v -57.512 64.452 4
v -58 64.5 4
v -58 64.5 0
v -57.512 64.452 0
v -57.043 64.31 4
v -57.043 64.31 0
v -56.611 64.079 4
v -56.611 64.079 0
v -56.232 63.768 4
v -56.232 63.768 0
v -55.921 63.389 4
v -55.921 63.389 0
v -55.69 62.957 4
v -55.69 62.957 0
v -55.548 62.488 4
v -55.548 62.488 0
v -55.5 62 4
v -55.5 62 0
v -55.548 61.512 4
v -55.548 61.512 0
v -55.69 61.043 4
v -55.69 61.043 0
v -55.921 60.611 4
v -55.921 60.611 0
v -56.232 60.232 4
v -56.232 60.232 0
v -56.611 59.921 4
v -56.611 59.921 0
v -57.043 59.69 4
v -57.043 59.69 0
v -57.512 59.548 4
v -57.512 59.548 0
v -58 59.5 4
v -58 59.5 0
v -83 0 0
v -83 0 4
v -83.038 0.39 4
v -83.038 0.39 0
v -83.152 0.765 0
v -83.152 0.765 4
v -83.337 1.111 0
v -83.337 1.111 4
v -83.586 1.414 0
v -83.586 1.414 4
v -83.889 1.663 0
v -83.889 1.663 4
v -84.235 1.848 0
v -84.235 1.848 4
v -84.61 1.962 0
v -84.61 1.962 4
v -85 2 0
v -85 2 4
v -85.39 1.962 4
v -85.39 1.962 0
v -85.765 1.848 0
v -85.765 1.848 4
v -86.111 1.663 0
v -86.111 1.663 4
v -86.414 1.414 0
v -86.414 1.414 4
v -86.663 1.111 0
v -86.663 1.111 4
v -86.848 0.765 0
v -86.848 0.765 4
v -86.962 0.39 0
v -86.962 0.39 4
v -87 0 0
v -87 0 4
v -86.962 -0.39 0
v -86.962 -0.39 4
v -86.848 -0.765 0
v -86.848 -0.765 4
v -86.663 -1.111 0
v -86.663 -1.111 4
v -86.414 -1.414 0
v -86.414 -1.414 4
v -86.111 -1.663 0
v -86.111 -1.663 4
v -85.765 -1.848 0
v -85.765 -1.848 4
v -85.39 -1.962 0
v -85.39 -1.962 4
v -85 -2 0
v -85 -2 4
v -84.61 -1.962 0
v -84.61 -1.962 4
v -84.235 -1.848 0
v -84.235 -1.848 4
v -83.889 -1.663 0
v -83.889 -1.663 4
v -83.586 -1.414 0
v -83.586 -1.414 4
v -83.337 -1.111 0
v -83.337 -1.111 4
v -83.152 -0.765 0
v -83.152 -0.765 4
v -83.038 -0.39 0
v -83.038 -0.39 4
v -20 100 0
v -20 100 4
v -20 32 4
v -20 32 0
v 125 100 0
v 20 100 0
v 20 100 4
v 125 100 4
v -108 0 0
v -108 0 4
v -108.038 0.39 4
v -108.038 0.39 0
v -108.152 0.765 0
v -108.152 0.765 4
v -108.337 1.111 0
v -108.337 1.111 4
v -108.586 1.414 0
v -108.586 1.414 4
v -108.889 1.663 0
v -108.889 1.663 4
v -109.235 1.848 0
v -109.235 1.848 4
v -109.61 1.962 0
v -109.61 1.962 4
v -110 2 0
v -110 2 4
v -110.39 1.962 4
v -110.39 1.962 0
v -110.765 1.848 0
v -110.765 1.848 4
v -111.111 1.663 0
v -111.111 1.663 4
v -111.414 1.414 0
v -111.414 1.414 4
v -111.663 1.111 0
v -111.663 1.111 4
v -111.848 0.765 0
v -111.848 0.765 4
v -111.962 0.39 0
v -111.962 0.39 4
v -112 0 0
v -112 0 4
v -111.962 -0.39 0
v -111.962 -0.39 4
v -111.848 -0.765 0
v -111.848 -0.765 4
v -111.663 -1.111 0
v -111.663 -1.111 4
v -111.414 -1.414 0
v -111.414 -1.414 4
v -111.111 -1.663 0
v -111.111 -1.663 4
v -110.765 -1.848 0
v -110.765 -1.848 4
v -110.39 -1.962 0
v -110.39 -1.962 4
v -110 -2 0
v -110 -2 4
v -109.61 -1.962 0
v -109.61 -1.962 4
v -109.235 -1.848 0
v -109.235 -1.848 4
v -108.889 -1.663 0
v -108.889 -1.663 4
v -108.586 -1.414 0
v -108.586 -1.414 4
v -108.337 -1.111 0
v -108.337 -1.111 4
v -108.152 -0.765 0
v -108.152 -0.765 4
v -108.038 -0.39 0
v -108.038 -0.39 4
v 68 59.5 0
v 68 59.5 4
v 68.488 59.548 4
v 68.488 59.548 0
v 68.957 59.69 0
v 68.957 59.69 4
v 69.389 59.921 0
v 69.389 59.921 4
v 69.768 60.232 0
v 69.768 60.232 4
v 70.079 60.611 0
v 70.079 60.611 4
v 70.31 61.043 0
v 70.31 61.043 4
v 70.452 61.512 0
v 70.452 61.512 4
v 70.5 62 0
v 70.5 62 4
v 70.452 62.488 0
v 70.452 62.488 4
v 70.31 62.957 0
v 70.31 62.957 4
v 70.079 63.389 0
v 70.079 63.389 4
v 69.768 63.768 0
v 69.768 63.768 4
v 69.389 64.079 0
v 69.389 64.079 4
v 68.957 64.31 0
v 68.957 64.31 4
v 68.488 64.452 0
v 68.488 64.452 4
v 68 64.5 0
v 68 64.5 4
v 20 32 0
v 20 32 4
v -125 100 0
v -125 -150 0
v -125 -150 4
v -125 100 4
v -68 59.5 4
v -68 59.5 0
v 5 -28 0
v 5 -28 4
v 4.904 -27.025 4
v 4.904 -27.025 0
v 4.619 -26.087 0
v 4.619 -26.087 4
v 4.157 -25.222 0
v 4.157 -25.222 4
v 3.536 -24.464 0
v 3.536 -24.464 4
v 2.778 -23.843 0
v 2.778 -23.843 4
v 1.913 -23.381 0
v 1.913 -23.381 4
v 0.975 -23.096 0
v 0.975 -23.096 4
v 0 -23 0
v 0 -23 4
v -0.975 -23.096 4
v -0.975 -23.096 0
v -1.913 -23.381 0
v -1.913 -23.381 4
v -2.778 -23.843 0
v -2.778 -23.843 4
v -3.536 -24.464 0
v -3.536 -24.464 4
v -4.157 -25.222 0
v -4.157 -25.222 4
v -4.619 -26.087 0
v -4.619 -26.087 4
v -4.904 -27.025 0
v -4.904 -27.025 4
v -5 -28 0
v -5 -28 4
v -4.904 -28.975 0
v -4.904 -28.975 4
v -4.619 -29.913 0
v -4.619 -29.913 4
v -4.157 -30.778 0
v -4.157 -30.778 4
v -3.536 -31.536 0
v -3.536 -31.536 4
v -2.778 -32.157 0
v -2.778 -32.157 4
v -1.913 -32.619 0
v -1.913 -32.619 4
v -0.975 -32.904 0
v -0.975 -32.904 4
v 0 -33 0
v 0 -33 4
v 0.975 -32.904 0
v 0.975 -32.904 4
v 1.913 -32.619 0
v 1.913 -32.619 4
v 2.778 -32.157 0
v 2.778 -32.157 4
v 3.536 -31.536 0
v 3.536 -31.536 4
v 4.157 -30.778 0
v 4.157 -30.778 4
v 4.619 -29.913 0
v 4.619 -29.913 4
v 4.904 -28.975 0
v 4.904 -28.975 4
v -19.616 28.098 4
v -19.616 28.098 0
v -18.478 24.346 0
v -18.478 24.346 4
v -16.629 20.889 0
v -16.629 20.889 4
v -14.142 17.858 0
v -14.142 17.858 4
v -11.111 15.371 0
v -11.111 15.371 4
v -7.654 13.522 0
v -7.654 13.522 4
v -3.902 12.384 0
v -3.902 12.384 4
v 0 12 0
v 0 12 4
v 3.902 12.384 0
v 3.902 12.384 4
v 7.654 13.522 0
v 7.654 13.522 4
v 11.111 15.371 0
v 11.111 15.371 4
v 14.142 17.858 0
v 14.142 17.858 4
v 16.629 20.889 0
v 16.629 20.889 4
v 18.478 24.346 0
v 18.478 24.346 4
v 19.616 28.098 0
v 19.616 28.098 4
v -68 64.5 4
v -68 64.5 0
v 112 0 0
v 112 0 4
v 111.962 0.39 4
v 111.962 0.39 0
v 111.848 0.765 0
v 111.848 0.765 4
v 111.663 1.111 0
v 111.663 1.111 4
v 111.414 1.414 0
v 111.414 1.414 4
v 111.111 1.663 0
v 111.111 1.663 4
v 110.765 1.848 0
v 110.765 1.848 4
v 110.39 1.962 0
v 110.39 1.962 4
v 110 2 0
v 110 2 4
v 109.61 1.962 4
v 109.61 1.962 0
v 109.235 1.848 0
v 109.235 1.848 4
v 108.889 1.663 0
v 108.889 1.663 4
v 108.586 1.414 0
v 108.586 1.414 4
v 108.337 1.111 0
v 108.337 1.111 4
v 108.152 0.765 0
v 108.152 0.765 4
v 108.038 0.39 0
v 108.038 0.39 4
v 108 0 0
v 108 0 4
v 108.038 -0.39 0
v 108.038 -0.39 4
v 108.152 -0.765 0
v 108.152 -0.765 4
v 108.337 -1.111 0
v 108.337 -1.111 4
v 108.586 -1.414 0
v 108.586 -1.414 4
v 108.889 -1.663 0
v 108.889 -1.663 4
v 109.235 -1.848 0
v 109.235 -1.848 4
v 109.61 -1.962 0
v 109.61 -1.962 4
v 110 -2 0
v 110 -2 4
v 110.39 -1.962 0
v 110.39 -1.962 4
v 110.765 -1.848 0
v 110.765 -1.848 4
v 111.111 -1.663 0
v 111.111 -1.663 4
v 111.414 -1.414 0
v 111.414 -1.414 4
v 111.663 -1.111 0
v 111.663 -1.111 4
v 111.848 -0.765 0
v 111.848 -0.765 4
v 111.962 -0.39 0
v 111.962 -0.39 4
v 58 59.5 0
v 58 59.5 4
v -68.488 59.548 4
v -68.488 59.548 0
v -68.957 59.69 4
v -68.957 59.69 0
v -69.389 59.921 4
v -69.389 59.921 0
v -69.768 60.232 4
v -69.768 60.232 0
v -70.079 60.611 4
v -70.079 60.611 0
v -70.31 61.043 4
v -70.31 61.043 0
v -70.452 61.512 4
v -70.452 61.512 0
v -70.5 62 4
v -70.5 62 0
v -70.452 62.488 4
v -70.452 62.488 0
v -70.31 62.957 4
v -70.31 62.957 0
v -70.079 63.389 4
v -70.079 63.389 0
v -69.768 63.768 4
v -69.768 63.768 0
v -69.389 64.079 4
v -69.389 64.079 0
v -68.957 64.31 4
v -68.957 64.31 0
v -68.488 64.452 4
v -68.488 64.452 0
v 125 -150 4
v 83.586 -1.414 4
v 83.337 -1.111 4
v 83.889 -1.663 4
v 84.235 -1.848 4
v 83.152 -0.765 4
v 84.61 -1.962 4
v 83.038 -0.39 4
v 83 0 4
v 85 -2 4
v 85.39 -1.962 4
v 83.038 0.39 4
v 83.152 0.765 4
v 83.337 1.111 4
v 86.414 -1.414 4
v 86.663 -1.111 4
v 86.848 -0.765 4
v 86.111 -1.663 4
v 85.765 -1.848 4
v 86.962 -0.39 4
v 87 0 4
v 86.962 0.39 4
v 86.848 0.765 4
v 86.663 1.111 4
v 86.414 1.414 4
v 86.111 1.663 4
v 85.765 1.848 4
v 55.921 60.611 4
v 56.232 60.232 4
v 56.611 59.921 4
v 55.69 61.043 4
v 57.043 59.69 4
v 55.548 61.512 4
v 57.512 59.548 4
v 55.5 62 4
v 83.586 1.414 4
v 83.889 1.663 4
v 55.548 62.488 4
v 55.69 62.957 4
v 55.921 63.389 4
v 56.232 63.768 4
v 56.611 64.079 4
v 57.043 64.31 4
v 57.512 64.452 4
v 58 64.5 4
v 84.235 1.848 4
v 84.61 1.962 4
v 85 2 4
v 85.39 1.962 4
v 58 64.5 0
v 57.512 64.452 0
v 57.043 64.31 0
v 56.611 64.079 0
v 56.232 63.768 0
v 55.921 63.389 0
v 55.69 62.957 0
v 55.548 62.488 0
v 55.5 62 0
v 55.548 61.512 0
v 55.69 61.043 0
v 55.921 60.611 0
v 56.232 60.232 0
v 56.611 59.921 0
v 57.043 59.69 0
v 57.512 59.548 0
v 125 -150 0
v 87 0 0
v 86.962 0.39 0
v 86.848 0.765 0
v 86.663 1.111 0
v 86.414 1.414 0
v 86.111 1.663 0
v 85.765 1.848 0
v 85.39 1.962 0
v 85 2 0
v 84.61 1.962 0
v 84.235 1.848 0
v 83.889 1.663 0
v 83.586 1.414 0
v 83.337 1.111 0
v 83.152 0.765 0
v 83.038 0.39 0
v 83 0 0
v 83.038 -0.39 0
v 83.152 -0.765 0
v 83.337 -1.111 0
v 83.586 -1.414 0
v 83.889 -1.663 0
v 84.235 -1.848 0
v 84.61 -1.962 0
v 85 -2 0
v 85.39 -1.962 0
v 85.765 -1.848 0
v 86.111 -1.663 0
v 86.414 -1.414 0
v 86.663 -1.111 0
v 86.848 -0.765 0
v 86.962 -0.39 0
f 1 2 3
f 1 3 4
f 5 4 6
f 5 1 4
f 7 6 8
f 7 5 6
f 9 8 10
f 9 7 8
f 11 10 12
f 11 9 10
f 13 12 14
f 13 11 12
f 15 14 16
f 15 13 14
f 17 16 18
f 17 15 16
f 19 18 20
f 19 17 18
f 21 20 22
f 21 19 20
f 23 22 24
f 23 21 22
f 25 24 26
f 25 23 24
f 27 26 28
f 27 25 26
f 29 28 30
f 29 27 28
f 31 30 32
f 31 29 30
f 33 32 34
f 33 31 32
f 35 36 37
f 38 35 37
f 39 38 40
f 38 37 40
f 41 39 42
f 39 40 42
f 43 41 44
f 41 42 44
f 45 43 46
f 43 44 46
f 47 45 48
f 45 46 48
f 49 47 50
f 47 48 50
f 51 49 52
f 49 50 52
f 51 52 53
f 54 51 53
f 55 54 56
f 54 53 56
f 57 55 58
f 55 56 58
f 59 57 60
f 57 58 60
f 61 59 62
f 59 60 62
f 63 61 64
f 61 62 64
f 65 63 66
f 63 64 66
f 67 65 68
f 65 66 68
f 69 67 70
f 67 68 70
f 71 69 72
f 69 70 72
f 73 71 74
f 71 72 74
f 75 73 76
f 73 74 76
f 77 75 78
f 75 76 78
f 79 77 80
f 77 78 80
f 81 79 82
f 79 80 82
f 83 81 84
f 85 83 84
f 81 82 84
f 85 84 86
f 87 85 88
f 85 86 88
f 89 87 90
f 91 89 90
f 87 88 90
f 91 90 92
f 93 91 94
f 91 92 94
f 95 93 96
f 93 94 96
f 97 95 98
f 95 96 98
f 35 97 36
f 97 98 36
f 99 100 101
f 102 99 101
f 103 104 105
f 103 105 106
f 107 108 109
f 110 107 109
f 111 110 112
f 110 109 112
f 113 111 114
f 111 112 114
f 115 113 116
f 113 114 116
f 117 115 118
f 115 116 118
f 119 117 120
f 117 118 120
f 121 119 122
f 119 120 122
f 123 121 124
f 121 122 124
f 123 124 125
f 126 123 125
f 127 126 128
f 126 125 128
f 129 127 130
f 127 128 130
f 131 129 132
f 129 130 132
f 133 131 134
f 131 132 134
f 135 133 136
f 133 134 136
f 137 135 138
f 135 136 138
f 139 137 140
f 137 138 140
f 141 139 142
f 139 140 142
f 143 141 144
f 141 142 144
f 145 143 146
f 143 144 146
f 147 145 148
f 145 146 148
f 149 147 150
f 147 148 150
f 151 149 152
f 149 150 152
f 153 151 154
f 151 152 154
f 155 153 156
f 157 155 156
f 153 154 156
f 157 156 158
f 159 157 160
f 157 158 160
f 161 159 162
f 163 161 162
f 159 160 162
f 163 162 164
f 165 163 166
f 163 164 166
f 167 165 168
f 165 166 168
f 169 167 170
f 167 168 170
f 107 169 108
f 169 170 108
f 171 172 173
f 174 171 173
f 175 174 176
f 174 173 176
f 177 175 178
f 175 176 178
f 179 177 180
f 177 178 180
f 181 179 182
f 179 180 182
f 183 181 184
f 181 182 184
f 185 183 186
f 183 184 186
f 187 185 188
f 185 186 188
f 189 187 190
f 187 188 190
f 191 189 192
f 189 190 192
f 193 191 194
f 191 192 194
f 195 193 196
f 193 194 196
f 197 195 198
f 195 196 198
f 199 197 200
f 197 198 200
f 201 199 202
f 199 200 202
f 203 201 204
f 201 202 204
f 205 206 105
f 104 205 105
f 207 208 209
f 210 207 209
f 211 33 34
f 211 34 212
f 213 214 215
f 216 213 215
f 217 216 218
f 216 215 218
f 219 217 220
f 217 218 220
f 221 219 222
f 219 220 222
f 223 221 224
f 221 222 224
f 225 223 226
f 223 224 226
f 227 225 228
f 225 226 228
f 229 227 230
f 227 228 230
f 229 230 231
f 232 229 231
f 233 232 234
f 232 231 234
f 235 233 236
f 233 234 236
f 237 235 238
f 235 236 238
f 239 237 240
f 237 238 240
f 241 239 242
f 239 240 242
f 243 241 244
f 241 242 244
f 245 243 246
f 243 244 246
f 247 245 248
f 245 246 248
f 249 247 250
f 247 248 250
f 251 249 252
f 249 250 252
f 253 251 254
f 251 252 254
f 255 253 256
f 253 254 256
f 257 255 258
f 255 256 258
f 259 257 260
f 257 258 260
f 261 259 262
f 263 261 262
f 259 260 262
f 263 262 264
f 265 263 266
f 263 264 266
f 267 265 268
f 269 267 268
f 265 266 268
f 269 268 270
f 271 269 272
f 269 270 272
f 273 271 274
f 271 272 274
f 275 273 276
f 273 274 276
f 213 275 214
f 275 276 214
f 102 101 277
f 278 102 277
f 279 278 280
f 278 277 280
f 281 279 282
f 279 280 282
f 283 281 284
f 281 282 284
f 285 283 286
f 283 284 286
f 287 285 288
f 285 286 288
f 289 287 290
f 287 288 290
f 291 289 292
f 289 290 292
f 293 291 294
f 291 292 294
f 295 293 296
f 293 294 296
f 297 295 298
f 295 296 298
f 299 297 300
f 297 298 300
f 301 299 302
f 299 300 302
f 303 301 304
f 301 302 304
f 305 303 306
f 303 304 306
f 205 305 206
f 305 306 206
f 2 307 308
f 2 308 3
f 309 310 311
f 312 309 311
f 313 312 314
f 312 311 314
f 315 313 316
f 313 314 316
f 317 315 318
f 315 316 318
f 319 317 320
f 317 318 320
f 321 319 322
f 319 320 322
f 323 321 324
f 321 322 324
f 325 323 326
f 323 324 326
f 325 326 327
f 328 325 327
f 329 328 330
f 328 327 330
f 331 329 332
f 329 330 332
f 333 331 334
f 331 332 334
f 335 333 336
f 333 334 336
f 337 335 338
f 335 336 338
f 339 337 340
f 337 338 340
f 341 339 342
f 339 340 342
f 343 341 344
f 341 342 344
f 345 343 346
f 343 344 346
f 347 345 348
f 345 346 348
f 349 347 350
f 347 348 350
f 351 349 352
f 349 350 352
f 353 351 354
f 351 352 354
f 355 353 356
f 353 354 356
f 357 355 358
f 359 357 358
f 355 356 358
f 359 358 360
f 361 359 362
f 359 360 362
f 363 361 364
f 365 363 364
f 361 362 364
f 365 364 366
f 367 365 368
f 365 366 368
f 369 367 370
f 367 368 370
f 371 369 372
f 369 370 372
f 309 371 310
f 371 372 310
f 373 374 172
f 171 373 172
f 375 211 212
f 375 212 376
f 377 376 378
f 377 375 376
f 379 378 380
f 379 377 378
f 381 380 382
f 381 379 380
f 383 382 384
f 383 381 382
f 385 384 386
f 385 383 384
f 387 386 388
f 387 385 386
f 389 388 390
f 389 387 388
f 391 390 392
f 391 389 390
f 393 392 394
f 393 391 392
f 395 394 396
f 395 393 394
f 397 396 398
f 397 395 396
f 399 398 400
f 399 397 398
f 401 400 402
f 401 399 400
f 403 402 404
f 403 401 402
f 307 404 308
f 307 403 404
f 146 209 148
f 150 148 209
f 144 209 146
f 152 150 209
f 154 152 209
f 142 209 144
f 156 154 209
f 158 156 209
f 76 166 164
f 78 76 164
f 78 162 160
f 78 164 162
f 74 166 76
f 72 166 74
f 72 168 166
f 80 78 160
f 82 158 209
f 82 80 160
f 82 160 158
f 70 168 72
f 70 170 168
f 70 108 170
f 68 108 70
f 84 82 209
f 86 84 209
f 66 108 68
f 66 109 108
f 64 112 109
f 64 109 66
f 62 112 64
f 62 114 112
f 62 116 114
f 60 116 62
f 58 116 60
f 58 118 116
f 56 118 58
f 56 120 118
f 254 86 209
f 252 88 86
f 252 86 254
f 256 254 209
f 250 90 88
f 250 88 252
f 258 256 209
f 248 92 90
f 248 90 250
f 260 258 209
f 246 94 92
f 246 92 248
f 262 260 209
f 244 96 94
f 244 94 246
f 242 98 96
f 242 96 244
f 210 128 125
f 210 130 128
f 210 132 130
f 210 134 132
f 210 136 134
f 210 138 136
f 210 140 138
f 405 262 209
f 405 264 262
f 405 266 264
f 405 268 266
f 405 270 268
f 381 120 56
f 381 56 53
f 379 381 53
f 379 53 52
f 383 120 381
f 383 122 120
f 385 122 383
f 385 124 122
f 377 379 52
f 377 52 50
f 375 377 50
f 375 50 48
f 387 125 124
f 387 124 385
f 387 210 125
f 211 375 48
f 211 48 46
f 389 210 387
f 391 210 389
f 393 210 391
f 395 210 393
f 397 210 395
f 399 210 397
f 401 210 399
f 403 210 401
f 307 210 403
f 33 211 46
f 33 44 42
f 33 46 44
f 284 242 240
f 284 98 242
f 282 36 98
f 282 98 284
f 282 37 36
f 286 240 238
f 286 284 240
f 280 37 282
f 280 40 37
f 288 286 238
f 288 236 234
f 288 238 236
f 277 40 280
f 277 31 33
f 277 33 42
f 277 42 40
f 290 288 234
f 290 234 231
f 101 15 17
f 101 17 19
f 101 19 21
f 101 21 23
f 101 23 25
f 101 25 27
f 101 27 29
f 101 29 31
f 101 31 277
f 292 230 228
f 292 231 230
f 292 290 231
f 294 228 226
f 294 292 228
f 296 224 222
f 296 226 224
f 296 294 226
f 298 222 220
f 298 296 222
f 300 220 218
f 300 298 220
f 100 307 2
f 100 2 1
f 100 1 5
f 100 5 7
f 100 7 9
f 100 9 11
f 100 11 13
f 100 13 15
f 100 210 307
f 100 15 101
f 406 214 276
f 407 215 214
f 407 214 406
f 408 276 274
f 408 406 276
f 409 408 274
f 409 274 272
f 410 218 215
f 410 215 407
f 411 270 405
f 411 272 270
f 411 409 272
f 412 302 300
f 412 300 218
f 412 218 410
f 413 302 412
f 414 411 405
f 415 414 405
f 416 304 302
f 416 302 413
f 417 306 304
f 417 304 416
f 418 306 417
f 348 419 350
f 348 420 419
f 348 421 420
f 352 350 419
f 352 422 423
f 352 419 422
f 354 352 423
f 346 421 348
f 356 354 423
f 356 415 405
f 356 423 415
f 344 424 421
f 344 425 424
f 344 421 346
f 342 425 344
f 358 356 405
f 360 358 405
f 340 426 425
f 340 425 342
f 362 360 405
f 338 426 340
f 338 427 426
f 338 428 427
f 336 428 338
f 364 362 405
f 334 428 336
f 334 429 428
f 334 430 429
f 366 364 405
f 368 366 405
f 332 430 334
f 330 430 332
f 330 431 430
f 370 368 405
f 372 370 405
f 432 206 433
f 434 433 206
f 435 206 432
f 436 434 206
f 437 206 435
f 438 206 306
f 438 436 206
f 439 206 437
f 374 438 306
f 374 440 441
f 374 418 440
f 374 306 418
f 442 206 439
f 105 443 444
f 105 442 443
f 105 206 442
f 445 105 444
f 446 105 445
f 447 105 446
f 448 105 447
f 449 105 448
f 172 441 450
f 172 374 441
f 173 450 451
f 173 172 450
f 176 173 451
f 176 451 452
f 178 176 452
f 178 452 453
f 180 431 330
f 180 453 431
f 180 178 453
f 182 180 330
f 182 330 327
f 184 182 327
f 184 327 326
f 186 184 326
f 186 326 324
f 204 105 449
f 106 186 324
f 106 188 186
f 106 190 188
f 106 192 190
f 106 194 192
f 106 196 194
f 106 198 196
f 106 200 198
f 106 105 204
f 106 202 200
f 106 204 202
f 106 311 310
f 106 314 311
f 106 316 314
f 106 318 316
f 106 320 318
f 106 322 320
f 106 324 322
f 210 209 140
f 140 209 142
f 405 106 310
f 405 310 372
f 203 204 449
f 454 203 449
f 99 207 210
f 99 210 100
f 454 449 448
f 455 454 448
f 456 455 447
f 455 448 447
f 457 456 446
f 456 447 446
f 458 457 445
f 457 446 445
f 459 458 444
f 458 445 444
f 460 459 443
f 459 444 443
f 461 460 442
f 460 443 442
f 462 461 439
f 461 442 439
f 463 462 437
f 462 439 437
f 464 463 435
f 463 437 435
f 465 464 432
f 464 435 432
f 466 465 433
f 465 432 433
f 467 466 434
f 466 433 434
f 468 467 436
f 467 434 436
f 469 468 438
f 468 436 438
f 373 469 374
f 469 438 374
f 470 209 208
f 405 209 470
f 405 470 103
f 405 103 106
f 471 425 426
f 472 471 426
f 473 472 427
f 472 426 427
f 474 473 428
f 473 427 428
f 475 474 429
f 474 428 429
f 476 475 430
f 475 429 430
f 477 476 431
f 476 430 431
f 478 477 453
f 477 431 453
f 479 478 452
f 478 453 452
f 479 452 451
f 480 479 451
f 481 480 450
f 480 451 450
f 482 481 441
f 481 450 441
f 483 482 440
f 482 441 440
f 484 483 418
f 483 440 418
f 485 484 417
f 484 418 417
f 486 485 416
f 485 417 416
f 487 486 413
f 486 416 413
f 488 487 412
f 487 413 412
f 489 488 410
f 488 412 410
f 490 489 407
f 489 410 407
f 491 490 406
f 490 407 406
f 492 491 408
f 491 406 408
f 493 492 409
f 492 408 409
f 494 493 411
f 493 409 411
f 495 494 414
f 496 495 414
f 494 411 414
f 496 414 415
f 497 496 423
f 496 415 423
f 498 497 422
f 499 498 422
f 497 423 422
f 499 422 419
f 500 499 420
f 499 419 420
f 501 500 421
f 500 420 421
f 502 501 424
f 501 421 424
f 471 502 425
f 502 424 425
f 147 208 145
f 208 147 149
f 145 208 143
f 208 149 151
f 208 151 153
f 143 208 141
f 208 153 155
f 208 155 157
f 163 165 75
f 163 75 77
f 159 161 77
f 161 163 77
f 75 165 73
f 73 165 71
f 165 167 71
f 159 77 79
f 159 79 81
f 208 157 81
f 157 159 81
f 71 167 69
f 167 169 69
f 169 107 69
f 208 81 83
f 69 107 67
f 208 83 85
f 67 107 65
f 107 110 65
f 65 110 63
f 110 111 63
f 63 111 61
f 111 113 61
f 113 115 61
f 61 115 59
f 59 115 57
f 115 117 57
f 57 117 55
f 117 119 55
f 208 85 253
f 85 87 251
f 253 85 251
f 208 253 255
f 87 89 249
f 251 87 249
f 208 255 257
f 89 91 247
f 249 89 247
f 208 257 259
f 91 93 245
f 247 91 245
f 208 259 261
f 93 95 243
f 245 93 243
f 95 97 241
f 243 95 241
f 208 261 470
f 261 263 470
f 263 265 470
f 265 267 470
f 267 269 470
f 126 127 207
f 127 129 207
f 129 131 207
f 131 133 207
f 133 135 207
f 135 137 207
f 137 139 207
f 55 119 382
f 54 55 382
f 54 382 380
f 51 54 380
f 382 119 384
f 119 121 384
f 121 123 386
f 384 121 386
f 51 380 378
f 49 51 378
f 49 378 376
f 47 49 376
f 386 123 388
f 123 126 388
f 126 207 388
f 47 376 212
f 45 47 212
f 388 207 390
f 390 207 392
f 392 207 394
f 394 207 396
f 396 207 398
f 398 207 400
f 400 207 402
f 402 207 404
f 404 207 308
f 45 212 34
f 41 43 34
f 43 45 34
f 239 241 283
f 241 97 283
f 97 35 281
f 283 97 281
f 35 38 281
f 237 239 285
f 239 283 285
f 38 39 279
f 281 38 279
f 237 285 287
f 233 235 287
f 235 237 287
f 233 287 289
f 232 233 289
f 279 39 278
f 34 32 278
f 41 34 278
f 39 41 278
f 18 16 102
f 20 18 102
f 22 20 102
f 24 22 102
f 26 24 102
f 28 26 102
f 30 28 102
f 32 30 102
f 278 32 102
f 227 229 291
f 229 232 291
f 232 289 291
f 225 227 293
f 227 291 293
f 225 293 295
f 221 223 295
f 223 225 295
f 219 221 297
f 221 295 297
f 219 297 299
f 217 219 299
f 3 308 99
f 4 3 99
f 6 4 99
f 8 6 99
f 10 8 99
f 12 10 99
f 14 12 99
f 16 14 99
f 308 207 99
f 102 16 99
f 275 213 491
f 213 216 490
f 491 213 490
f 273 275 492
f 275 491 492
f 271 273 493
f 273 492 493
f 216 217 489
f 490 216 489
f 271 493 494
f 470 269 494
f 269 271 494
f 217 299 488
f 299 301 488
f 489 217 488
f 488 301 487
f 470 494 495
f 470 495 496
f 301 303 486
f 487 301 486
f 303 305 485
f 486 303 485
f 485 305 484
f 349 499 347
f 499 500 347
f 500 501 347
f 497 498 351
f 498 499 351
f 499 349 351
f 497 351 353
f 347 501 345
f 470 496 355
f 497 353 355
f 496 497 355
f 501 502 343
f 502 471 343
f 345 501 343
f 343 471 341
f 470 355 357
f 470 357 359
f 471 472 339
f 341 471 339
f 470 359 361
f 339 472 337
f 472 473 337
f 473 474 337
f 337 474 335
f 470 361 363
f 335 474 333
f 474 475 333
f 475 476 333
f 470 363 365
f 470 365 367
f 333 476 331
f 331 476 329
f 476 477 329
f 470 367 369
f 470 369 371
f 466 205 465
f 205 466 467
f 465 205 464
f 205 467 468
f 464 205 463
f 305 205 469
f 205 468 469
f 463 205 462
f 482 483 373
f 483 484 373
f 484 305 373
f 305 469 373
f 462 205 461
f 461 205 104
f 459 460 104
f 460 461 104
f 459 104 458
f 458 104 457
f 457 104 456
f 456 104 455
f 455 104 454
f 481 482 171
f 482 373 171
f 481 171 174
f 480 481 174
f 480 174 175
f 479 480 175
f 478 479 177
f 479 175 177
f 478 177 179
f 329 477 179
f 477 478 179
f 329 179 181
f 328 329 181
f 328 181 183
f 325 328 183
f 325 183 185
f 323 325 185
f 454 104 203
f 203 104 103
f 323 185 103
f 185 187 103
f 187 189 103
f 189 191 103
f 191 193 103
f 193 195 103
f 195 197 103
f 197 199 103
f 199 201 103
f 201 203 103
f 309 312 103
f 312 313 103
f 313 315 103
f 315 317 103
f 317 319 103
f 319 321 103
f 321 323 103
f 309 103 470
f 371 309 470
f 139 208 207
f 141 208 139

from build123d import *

# Parameters (mm, degrees)
SKETCH1_W           = 250
SKETCH1_H           = 200
BOSS_EXTRUDE1_DEPTH = 4
SKETCH2_R           = 2
CUT_EXTRUDE1_DEPTH  = 4
SKETCH3_R           = 5
CUT_EXTRUDE2_DEPTH  = 4
SKETCH8_W           = 250
SKETCH8_H           = 4
BOSS_EXTRUDE2_DEPTH = 50


with BuildPart() as part:
    # Sketch1 → Boss-Extrude1 (new body)
    with BuildSketch(Plane.XY):
        Rectangle(SKETCH1_W, SKETCH1_H)
    extrude(amount=BOSS_EXTRUDE1_DEPTH)

    # Sketch2 → Cut-Extrude1 (cut)
    with BuildSketch(Plane.XY.offset(4)):
        with Locations((-110, 0)):
            Circle(SKETCH2_R)
        with Locations((-85, 0)):
            Circle(SKETCH2_R)
        with Locations((110, 0)):
            Circle(SKETCH2_R)
        with Locations((85, 0)):
            Circle(SKETCH2_R)
    extrude(amount=-CUT_EXTRUDE1_DEPTH, mode=Mode.SUBTRACT)

    # Sketch3 → Cut-Extrude2 (cut)
    with BuildSketch(Plane.XY.offset(4)):
        with Locations((0, -28)):
            Circle(SKETCH3_R)
        with BuildLine():
            Line((20, 32), (20, 100))
            Line((20, 100), (-20, 100))
            Line((-20, 100), (-20, 32))
            ThreePointArc((-20, 32), (0, 12), (20, 32))
        make_face()
        with BuildLine():
            Line((-68, 64.5), (-58, 64.5))
            ThreePointArc((-58, 64.5), (-55.5, 62), (-58, 59.5))
            Line((-58, 59.5), (-68, 59.5))
            ThreePointArc((-68, 59.5), (-70.5, 62), (-68, 64.5))
        make_face()
        with BuildLine():
            Line((58, 59.5), (68, 59.5))
            ThreePointArc((68, 59.5), (70.5, 62), (68, 64.5))
            Line((68, 64.5), (58, 64.5))
            ThreePointArc((58, 64.5), (55.5, 62), (58, 59.5))
        make_face()
    extrude(amount=-CUT_EXTRUDE2_DEPTH, mode=Mode.SUBTRACT)

    # Sketch8 → Boss-Extrude2 (add)
    with BuildSketch(Plane.XZ.offset(100)):
        with Locations((0, 2)):
            Rectangle(SKETCH8_W, SKETCH8_H)
    extrude(amount=BOSS_EXTRUDE2_DEPTH)


solid = part.part
